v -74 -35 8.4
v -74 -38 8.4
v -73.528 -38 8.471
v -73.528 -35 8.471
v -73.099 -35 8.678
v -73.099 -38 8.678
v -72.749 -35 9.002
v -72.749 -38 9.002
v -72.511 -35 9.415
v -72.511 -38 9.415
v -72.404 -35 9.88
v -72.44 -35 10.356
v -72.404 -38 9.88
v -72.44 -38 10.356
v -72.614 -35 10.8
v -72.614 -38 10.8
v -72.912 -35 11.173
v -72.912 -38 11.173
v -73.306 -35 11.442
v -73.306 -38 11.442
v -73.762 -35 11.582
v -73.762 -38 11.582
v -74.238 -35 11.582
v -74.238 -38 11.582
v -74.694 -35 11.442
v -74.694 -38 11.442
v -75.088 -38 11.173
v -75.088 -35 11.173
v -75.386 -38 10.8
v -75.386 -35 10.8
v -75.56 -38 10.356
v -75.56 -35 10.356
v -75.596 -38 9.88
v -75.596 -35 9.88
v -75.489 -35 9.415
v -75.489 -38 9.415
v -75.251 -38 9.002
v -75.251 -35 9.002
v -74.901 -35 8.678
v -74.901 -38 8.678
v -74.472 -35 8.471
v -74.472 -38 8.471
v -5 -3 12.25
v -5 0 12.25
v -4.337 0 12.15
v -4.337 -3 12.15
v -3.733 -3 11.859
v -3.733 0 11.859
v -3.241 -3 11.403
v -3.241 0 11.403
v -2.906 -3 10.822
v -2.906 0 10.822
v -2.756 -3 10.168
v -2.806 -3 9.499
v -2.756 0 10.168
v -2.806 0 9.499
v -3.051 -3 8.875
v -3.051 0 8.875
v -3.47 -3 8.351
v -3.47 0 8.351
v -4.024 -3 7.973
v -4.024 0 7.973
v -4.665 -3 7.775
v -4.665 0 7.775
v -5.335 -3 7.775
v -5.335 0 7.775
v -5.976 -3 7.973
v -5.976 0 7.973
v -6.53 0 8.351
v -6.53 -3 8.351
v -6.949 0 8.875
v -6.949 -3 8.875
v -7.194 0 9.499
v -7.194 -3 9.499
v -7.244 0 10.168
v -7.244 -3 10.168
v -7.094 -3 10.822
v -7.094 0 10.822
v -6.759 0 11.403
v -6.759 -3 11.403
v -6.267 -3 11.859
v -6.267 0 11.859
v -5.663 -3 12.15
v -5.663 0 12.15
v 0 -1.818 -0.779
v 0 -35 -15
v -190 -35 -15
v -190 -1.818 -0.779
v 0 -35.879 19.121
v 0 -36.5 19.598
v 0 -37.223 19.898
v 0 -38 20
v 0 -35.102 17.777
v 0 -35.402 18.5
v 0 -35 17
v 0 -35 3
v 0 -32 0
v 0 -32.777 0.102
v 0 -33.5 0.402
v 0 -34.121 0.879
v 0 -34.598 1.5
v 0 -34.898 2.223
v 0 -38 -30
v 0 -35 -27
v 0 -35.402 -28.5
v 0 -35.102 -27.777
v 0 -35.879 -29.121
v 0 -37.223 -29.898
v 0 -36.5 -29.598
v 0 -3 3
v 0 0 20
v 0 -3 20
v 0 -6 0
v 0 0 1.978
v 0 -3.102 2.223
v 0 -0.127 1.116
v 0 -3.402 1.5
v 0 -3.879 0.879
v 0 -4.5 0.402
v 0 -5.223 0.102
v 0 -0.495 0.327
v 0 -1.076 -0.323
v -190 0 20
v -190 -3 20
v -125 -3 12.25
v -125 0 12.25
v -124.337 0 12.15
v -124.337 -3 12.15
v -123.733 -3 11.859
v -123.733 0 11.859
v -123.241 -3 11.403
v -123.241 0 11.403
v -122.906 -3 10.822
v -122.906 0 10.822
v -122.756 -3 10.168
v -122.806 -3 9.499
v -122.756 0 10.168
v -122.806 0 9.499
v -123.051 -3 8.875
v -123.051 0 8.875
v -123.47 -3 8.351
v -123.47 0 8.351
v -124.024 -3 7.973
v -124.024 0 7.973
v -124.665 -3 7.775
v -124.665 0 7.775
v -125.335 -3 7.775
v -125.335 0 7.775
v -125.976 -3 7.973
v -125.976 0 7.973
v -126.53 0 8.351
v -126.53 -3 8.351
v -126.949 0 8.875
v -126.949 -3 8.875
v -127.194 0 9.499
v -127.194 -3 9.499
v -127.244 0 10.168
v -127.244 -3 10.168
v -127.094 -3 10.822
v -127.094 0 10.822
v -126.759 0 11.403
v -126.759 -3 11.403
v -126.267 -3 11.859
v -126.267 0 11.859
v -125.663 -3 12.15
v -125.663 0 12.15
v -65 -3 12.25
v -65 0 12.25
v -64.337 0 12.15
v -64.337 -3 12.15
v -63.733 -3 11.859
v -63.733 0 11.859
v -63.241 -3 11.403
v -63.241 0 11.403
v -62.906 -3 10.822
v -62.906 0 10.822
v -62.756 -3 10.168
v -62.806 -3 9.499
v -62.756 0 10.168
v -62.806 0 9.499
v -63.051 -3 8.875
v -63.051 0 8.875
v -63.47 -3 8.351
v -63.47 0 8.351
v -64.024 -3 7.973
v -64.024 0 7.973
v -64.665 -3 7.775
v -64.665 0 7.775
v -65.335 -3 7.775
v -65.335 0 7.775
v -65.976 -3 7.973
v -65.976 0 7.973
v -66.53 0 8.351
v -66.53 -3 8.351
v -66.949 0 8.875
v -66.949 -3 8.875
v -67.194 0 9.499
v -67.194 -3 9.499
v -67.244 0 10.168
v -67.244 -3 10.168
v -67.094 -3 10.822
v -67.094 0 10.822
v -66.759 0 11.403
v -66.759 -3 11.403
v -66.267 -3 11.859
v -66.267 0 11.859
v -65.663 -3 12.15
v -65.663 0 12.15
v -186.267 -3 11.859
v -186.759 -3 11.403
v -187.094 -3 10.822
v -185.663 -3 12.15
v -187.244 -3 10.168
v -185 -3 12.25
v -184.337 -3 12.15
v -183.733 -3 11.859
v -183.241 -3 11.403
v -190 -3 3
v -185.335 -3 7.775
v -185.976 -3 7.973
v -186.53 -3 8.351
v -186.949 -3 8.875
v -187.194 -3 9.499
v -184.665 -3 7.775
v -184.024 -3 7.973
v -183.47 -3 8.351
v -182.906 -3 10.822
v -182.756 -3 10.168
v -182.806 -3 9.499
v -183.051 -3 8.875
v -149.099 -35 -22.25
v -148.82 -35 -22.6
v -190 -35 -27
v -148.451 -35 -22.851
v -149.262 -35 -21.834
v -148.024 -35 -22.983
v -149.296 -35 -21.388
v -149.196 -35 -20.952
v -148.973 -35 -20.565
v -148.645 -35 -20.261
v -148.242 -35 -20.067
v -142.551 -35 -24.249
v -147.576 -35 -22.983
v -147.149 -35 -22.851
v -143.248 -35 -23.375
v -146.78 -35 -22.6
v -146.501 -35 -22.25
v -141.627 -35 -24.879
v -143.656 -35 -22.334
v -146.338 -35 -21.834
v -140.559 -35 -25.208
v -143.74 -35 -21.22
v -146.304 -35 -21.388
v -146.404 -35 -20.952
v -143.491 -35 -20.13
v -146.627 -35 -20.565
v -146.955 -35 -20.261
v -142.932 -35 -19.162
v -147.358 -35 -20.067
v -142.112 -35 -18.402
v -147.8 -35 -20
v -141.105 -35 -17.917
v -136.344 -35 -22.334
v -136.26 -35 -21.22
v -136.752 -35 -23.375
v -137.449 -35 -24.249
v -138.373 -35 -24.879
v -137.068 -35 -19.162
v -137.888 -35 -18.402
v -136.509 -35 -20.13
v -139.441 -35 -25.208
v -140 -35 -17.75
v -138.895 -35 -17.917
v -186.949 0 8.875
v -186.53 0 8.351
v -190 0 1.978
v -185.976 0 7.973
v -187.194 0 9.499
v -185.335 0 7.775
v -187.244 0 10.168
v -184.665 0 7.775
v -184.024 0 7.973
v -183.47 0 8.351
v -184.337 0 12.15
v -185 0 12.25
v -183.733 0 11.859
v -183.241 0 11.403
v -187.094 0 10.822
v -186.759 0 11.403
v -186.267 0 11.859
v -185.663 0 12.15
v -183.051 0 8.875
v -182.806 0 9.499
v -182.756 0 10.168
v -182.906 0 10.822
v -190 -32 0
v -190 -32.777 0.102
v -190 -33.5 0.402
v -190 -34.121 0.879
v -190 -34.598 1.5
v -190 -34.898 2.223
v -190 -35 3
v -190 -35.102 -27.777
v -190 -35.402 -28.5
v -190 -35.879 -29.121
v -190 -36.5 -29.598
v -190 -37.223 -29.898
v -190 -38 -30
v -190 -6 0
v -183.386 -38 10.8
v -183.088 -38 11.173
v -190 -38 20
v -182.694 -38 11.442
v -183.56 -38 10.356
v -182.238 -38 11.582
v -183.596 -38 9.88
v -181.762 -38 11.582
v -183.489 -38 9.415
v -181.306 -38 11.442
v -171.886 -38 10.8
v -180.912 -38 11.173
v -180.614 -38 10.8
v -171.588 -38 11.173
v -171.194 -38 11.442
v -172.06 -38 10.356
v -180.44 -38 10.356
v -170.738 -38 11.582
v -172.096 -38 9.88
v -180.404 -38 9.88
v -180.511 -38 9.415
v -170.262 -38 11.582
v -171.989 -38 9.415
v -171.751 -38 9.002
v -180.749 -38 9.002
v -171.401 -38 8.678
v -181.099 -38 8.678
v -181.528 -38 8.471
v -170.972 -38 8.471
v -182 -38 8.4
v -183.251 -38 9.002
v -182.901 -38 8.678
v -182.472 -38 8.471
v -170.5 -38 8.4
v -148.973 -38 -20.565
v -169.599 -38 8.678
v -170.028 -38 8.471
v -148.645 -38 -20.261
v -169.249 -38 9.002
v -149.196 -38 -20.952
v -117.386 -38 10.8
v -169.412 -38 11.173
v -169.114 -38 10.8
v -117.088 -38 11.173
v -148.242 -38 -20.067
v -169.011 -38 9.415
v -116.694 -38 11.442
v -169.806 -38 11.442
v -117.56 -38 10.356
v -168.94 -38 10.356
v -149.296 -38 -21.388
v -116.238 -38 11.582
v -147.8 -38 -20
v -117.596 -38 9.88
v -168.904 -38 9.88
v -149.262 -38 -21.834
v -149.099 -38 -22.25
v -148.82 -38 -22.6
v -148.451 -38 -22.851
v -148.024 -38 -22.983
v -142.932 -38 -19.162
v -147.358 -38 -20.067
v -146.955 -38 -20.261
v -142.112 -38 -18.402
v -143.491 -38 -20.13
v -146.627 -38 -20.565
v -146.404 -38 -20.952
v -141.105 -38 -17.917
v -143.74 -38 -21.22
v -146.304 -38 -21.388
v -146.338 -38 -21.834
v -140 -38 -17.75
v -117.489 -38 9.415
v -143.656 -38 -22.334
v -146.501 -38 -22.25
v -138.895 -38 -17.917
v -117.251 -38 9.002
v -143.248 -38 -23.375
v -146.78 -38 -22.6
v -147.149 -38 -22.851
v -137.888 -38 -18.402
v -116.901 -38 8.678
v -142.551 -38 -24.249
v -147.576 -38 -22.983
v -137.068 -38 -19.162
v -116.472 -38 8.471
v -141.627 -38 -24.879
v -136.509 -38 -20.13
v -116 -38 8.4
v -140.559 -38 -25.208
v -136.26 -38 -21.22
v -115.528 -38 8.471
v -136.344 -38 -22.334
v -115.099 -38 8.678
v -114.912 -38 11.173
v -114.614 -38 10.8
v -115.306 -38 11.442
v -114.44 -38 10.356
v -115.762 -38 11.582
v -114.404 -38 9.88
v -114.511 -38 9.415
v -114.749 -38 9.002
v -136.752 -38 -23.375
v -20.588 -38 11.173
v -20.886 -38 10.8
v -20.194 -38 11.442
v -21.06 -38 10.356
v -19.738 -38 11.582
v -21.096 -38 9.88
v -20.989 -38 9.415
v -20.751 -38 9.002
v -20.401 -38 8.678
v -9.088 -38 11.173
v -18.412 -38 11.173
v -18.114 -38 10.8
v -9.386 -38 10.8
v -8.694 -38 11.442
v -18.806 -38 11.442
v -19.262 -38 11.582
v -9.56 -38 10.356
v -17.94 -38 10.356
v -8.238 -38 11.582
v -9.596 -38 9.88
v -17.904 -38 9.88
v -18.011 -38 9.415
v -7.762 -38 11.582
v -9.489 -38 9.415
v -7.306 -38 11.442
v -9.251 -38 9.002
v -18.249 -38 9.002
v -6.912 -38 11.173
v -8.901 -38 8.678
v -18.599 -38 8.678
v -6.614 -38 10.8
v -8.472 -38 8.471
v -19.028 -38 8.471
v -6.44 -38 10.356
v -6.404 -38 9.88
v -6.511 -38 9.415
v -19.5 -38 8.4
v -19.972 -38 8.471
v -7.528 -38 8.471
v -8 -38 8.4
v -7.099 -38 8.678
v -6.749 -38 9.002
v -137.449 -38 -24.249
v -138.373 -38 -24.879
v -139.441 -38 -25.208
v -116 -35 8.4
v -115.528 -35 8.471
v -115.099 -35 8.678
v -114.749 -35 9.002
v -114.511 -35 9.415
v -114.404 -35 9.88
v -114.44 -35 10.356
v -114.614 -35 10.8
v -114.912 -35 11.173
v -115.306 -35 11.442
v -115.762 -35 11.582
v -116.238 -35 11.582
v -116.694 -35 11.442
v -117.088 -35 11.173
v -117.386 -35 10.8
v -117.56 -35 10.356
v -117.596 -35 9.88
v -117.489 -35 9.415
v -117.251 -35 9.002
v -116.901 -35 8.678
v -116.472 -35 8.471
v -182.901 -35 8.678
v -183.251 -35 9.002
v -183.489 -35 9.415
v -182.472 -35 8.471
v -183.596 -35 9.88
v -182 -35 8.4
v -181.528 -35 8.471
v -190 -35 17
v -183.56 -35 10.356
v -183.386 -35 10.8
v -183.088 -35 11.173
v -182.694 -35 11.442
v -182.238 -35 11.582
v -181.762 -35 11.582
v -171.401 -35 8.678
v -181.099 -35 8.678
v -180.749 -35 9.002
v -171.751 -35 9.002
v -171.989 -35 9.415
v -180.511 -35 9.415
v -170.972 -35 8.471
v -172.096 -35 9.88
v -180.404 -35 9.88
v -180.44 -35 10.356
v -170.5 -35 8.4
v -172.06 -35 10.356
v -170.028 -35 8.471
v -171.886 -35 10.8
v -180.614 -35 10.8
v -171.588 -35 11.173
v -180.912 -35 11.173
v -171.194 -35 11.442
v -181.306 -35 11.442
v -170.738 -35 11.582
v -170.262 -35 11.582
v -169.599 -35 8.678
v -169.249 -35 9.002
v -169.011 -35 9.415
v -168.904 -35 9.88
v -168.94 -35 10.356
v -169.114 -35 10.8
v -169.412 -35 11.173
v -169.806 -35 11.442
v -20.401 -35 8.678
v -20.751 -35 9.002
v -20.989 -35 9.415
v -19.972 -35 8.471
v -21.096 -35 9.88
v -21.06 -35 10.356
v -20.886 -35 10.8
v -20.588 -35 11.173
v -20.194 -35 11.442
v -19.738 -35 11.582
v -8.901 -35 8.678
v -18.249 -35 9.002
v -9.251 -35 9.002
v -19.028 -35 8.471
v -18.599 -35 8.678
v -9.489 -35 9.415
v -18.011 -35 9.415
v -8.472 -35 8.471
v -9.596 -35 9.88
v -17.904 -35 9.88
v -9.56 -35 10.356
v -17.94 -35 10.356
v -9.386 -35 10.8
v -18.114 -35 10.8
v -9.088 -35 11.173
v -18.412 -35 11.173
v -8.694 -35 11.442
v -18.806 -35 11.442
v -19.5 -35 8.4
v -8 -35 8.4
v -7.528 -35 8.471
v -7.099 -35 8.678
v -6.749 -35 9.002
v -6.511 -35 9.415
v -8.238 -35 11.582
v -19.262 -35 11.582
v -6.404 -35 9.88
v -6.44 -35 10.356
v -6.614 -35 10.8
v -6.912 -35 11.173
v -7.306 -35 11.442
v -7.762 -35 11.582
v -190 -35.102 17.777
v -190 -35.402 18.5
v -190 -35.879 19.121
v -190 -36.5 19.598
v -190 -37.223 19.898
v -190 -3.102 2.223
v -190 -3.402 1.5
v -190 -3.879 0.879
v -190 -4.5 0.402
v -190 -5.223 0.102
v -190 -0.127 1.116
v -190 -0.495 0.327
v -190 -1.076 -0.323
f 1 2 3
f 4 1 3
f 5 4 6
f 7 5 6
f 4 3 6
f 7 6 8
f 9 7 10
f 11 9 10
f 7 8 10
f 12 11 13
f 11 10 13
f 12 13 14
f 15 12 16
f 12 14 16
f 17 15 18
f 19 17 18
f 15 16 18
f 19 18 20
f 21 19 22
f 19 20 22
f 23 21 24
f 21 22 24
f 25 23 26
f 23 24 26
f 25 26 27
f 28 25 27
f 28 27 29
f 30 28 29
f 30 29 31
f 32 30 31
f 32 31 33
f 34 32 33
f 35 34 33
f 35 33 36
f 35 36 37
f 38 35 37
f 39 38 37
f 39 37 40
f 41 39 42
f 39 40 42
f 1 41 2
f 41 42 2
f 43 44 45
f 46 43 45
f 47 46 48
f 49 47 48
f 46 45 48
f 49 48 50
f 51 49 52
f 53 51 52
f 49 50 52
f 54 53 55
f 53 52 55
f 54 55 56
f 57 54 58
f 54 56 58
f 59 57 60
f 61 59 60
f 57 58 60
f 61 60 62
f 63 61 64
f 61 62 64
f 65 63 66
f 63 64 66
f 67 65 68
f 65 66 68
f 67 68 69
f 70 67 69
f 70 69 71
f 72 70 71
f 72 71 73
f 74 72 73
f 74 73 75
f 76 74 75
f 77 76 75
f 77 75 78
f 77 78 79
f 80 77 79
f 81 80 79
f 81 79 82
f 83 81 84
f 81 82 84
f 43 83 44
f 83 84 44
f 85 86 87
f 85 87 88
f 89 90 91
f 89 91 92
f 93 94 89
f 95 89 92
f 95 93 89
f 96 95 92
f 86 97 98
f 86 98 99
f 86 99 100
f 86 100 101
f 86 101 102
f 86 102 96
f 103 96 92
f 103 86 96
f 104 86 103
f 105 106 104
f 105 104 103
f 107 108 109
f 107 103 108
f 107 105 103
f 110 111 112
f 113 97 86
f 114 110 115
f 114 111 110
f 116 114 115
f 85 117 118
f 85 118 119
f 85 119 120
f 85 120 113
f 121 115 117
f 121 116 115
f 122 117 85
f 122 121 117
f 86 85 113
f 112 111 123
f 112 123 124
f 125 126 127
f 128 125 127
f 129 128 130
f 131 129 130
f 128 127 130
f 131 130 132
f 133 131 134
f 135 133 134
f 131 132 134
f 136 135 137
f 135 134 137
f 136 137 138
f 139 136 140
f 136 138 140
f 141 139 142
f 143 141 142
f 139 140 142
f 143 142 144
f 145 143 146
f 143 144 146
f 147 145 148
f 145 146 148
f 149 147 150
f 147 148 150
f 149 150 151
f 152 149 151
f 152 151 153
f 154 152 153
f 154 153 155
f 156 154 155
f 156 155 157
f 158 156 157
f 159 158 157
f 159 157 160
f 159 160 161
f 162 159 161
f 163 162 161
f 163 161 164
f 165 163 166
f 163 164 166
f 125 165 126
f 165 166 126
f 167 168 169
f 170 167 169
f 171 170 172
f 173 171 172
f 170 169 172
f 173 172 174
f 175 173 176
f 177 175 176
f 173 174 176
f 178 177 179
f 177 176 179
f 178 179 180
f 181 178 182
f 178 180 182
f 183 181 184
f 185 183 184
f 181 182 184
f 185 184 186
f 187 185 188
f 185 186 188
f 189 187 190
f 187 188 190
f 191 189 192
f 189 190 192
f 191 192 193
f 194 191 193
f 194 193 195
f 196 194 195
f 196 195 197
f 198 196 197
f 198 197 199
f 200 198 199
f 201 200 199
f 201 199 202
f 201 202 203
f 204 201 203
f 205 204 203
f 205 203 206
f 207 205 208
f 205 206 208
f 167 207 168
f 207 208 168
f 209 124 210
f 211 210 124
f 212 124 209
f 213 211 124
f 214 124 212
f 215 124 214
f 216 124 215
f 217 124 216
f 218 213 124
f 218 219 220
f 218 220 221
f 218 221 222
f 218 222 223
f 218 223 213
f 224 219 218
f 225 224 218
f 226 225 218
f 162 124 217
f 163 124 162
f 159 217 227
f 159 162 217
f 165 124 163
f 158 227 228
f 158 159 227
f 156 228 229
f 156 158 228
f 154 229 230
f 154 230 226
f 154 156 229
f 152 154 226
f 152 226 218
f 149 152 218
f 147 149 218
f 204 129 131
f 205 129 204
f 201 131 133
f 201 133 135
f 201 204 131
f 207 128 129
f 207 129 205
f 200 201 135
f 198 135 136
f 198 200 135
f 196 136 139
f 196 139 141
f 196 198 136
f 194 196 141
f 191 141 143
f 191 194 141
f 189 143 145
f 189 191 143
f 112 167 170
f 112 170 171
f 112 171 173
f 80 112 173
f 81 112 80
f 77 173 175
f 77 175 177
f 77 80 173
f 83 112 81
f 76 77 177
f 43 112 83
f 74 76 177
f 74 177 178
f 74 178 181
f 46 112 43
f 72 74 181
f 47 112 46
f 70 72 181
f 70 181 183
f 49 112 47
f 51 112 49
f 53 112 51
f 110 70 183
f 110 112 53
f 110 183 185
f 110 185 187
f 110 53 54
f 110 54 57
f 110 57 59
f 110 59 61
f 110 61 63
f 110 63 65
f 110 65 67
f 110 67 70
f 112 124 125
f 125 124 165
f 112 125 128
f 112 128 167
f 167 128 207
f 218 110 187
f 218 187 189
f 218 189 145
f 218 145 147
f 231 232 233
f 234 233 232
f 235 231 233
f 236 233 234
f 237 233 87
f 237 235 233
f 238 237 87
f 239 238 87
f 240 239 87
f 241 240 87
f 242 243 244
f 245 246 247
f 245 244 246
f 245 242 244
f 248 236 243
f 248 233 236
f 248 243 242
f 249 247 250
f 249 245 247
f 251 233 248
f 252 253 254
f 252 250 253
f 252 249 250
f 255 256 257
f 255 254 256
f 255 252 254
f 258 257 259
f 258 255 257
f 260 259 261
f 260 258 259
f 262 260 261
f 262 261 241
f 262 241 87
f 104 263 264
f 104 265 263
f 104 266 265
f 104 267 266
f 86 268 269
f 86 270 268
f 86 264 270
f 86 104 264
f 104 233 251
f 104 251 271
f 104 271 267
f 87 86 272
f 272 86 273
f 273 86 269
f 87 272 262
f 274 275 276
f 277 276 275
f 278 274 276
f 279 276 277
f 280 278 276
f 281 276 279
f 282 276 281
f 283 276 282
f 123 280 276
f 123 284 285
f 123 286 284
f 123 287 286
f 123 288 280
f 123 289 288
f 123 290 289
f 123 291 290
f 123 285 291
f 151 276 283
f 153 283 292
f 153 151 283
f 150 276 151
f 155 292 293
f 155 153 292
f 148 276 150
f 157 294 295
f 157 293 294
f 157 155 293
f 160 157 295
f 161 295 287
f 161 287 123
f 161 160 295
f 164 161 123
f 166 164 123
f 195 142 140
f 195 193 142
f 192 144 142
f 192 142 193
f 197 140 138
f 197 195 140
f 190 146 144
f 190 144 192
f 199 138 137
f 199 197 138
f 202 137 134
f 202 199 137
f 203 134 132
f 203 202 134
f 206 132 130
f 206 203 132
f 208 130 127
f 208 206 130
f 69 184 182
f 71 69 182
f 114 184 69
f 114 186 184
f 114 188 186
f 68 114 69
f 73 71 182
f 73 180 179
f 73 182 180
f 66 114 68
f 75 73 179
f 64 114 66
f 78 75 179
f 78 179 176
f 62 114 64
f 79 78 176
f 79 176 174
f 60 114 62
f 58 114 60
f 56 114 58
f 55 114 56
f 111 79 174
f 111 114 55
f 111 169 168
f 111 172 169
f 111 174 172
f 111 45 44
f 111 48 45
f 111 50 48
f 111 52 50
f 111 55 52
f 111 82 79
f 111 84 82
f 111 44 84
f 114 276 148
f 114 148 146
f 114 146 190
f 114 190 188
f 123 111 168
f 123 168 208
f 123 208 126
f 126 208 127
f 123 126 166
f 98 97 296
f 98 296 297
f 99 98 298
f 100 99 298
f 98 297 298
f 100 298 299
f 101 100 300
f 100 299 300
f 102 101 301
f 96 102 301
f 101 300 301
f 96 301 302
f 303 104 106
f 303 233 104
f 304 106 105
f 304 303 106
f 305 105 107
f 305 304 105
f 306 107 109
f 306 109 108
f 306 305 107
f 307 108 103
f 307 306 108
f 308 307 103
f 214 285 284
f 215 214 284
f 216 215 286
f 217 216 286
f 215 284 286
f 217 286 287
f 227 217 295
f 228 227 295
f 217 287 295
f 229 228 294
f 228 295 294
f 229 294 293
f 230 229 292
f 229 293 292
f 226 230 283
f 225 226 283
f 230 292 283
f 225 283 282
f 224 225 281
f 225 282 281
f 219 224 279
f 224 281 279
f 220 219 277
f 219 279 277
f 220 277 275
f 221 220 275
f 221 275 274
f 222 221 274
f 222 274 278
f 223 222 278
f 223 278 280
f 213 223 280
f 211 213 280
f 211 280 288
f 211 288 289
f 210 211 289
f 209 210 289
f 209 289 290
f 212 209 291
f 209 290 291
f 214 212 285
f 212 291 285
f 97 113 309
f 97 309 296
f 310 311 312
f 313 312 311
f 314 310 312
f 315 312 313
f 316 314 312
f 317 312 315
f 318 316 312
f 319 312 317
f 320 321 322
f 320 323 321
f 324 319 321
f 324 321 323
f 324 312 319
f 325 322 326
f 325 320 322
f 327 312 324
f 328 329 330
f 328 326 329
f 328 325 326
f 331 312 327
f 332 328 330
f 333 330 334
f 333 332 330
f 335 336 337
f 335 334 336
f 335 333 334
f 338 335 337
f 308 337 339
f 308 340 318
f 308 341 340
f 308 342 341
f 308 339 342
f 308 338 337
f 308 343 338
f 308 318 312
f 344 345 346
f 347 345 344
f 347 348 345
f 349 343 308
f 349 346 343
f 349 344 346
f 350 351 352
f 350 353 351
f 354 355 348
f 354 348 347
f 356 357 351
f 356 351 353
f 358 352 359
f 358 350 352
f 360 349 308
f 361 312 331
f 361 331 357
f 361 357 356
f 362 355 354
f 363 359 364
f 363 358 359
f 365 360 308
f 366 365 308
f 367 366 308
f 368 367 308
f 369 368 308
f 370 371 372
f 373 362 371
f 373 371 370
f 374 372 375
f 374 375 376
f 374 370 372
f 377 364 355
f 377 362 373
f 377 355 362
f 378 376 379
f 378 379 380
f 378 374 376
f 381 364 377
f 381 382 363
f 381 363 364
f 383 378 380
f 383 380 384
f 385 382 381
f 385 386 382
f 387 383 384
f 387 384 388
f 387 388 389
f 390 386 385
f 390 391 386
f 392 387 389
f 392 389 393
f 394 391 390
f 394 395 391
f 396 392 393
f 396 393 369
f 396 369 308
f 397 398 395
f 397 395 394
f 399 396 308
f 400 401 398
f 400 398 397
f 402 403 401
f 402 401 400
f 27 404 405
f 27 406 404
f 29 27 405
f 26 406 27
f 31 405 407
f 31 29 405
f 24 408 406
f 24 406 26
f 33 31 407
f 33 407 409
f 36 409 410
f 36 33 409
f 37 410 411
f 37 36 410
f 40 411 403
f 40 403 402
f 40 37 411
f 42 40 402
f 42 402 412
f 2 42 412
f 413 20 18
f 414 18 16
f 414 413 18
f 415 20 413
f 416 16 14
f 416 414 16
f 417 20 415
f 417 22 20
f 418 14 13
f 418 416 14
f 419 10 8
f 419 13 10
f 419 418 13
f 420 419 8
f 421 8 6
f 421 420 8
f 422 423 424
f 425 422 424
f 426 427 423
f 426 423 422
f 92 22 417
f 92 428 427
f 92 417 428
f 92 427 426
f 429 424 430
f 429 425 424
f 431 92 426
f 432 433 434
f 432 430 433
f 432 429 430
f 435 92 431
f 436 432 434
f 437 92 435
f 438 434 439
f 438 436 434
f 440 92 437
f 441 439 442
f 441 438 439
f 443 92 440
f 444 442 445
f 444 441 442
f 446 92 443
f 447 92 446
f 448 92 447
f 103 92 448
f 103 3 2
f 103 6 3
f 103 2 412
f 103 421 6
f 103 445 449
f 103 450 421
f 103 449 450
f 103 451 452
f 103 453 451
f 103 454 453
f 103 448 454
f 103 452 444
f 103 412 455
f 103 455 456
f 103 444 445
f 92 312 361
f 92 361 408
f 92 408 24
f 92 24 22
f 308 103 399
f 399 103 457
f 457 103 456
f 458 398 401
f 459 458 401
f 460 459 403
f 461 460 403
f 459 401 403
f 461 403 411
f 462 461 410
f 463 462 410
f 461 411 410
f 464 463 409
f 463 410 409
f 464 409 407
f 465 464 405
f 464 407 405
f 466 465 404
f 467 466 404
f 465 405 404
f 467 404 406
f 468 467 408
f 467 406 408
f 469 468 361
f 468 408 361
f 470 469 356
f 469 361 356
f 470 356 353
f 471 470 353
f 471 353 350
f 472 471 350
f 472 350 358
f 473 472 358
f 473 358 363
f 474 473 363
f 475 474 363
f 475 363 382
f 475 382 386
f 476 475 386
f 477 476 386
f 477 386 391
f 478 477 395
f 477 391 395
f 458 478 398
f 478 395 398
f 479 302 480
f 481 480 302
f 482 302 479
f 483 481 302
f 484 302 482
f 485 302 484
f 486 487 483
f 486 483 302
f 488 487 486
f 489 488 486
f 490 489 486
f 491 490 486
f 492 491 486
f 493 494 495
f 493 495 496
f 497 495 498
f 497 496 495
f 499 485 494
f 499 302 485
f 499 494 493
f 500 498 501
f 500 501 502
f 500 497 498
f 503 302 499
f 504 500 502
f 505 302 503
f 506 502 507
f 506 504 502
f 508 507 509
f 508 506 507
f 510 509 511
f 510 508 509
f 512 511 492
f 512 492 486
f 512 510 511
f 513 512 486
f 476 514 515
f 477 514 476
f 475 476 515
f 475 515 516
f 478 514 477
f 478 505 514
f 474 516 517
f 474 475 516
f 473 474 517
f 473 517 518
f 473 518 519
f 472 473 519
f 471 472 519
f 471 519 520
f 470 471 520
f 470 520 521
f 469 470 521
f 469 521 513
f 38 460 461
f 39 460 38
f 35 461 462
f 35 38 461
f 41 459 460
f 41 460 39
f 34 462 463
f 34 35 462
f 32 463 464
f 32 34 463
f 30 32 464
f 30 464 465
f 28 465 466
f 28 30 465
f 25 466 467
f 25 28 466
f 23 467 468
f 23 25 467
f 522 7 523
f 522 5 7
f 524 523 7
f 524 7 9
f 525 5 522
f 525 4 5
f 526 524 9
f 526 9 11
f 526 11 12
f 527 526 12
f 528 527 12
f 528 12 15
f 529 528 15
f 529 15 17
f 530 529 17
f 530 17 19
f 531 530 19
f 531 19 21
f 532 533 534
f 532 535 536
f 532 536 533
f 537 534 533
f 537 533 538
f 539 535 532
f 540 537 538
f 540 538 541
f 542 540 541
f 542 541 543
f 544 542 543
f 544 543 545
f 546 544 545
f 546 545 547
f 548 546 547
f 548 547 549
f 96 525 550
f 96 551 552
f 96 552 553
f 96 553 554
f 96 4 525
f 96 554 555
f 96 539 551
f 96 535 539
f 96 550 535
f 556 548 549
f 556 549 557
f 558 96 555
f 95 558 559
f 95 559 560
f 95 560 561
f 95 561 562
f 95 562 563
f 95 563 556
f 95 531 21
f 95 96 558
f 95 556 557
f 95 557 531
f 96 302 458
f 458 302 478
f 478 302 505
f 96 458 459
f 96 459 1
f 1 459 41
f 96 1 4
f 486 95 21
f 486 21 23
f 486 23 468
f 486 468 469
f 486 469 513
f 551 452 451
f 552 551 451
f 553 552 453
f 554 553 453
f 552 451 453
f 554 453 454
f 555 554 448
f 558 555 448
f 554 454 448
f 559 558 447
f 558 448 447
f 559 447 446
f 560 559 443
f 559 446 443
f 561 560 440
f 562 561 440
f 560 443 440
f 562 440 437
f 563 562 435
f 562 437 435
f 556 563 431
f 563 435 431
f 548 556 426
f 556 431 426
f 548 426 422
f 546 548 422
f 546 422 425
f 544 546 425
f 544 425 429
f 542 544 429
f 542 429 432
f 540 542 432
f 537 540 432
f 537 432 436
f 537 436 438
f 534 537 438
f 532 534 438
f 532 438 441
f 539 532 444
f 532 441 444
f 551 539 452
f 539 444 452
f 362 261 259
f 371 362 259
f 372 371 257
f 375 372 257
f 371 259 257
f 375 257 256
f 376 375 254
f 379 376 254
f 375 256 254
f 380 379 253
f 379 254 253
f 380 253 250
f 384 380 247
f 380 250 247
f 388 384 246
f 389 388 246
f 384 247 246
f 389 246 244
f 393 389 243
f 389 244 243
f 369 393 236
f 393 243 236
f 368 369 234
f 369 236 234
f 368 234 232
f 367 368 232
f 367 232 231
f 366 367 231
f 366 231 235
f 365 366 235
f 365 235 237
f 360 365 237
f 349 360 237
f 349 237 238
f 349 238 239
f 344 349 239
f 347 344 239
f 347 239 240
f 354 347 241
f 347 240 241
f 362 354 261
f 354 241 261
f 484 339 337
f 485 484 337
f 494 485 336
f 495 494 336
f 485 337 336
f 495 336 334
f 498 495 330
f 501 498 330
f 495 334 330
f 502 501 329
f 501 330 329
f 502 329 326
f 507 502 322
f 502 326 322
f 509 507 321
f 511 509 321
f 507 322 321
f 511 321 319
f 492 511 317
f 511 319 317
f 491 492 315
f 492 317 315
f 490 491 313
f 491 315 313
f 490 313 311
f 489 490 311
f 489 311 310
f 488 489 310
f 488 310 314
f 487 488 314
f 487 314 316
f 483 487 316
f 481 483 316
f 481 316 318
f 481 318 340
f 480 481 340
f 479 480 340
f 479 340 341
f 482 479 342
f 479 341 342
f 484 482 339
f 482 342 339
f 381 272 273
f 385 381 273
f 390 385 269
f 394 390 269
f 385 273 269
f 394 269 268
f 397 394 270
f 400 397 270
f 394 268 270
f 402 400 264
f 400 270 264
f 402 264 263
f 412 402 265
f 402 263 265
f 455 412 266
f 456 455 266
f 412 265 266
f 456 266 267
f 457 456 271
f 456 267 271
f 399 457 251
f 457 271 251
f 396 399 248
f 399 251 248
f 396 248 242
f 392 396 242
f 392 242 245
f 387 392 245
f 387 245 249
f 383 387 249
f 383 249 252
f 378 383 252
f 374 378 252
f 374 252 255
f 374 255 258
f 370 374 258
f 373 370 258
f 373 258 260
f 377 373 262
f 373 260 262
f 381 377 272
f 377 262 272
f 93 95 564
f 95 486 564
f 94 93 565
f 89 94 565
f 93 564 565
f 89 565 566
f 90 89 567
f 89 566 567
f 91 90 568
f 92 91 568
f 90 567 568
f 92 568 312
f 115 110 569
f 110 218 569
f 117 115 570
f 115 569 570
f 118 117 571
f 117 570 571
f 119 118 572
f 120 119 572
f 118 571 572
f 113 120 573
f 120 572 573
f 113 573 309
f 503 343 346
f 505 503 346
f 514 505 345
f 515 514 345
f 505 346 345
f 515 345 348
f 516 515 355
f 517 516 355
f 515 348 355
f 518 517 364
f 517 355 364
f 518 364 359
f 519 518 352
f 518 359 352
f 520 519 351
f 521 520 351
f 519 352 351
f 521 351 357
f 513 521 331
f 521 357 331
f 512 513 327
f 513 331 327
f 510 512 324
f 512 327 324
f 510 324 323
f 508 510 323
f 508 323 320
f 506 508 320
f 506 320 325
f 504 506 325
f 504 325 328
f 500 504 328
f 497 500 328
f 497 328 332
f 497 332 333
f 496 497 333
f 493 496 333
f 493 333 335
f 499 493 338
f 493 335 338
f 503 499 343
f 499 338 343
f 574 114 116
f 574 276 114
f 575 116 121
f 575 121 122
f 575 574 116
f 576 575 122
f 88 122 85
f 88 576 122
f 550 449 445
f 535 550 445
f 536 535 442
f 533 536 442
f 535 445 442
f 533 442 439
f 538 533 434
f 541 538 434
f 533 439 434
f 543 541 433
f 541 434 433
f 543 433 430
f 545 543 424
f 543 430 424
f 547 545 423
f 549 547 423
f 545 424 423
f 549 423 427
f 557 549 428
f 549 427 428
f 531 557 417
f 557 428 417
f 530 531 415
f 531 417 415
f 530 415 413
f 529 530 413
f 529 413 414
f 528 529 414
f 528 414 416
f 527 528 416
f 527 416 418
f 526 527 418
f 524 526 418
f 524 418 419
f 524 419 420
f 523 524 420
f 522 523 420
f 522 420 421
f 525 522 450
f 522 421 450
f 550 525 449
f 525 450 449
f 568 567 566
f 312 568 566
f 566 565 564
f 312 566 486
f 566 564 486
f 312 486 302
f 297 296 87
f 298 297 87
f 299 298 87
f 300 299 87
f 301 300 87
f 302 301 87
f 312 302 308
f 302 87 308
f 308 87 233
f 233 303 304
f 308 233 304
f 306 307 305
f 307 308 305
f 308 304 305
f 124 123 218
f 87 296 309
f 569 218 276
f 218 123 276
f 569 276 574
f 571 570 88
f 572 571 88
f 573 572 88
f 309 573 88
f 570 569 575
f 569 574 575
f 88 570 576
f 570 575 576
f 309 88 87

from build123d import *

# Parameters (mm, degrees)
BOSS_EXTRUDE1_DEPTH = 190
SKETCH2_R           = 2.25
CUT_EXTRUDE1_DEPTH  = 3
SKETCH3_R           = 1.6
CUT_EXTRUDE2_DEPTH  = 3
SKETCH4_R           = 3.75
SKETCH4_R_2         = 1.5
CUT_EXTRUDE3_DEPTH  = 3
FILLET1_R           = 3


with BuildPart() as part:
    # Sketch1 → Boss-Extrude1 (new body)
    with BuildSketch(Plane(origin=(0, 0, 0), x_dir=(0, 0, -1), z_dir=(1, 0, 0))):
        Polygon((0, 0), (-20, 0), (-20, -3), (0, -3), (0, -35), (-20, -35), (-20, -38), (30, -38), (30, -35), (15, -35), align=None)
    extrude(amount=-BOSS_EXTRUDE1_DEPTH)

    # Sketch2 → Cut-Extrude1 (cut)
    with BuildSketch(Plane(origin=(0, 0, 0), x_dir=(1, 0, 0), z_dir=(0, 1, 0))):
        with Locations(Location((-185, -10, 0), (0, 0, 270))):
            Circle(SKETCH2_R)
        with Locations(Location((-125, -10, 0), (0, 0, 270))):
            Circle(SKETCH2_R)
        with Locations(Location((-65, -10, 0), (0, 0, 270))):
            Circle(SKETCH2_R)
        with Locations(Location((-5, -10, 0), (0, 0, 270))):
            Circle(SKETCH2_R)
    extrude(amount=-CUT_EXTRUDE1_DEPTH, mode=Mode.SUBTRACT)

    # Sketch3 → Cut-Extrude2 (cut)
    with BuildSketch(Plane.XZ.offset(38)):
        with Locations(Location((-116, 10, 0), (0, 0, 270))):
            Circle(SKETCH3_R)
        with Locations(Location((-74, 10, 0), (0, 0, 270))):
            Circle(SKETCH3_R)
        with Locations(Location((-182, 10, 0), (0, 0, 270))):
            Circle(SKETCH3_R)
        with Locations(Location((-170.5, 10, 0), (0, 0, 270))):
            Circle(SKETCH3_R)
        with Locations(Location((-19.5, 10, 0), (0, 0, 270))):
            Circle(SKETCH3_R)
        with Locations(Location((-8, 10, 0), (0, 0, 270))):
            Circle(SKETCH3_R)
    extrude(amount=-CUT_EXTRUDE2_DEPTH, mode=Mode.SUBTRACT)

    # Sketch4 → Cut-Extrude3 (cut)
    with BuildSketch(Plane(origin=(0, -35, 0), x_dir=(1, 0, 0), z_dir=(0, 1, 0))):
        with Locations(Location((-140, 21.5, 0), (0, 0, 270))):
            Circle(SKETCH4_R)
        with Locations(Location((-147.8, 21.5, 0), (0, 0, 270))):
            Circle(SKETCH4_R_2)
    extrude(amount=-CUT_EXTRUDE3_DEPTH, mode=Mode.SUBTRACT)

    # Fillet1
    fillet1_edges = [part.edges().sort_by_distance(p)[0] for p in [
        (-95, -35, 0),
        (-95, -3, 0),
        (-95, -35, -30),
        (-95, -35, 20),
        (-95, 0, 0),
    ]]
    fillet(fillet1_edges, radius=FILLET1_R - 0.0001)  # a hair under: the kernel refuses the full size


solid = part.part
